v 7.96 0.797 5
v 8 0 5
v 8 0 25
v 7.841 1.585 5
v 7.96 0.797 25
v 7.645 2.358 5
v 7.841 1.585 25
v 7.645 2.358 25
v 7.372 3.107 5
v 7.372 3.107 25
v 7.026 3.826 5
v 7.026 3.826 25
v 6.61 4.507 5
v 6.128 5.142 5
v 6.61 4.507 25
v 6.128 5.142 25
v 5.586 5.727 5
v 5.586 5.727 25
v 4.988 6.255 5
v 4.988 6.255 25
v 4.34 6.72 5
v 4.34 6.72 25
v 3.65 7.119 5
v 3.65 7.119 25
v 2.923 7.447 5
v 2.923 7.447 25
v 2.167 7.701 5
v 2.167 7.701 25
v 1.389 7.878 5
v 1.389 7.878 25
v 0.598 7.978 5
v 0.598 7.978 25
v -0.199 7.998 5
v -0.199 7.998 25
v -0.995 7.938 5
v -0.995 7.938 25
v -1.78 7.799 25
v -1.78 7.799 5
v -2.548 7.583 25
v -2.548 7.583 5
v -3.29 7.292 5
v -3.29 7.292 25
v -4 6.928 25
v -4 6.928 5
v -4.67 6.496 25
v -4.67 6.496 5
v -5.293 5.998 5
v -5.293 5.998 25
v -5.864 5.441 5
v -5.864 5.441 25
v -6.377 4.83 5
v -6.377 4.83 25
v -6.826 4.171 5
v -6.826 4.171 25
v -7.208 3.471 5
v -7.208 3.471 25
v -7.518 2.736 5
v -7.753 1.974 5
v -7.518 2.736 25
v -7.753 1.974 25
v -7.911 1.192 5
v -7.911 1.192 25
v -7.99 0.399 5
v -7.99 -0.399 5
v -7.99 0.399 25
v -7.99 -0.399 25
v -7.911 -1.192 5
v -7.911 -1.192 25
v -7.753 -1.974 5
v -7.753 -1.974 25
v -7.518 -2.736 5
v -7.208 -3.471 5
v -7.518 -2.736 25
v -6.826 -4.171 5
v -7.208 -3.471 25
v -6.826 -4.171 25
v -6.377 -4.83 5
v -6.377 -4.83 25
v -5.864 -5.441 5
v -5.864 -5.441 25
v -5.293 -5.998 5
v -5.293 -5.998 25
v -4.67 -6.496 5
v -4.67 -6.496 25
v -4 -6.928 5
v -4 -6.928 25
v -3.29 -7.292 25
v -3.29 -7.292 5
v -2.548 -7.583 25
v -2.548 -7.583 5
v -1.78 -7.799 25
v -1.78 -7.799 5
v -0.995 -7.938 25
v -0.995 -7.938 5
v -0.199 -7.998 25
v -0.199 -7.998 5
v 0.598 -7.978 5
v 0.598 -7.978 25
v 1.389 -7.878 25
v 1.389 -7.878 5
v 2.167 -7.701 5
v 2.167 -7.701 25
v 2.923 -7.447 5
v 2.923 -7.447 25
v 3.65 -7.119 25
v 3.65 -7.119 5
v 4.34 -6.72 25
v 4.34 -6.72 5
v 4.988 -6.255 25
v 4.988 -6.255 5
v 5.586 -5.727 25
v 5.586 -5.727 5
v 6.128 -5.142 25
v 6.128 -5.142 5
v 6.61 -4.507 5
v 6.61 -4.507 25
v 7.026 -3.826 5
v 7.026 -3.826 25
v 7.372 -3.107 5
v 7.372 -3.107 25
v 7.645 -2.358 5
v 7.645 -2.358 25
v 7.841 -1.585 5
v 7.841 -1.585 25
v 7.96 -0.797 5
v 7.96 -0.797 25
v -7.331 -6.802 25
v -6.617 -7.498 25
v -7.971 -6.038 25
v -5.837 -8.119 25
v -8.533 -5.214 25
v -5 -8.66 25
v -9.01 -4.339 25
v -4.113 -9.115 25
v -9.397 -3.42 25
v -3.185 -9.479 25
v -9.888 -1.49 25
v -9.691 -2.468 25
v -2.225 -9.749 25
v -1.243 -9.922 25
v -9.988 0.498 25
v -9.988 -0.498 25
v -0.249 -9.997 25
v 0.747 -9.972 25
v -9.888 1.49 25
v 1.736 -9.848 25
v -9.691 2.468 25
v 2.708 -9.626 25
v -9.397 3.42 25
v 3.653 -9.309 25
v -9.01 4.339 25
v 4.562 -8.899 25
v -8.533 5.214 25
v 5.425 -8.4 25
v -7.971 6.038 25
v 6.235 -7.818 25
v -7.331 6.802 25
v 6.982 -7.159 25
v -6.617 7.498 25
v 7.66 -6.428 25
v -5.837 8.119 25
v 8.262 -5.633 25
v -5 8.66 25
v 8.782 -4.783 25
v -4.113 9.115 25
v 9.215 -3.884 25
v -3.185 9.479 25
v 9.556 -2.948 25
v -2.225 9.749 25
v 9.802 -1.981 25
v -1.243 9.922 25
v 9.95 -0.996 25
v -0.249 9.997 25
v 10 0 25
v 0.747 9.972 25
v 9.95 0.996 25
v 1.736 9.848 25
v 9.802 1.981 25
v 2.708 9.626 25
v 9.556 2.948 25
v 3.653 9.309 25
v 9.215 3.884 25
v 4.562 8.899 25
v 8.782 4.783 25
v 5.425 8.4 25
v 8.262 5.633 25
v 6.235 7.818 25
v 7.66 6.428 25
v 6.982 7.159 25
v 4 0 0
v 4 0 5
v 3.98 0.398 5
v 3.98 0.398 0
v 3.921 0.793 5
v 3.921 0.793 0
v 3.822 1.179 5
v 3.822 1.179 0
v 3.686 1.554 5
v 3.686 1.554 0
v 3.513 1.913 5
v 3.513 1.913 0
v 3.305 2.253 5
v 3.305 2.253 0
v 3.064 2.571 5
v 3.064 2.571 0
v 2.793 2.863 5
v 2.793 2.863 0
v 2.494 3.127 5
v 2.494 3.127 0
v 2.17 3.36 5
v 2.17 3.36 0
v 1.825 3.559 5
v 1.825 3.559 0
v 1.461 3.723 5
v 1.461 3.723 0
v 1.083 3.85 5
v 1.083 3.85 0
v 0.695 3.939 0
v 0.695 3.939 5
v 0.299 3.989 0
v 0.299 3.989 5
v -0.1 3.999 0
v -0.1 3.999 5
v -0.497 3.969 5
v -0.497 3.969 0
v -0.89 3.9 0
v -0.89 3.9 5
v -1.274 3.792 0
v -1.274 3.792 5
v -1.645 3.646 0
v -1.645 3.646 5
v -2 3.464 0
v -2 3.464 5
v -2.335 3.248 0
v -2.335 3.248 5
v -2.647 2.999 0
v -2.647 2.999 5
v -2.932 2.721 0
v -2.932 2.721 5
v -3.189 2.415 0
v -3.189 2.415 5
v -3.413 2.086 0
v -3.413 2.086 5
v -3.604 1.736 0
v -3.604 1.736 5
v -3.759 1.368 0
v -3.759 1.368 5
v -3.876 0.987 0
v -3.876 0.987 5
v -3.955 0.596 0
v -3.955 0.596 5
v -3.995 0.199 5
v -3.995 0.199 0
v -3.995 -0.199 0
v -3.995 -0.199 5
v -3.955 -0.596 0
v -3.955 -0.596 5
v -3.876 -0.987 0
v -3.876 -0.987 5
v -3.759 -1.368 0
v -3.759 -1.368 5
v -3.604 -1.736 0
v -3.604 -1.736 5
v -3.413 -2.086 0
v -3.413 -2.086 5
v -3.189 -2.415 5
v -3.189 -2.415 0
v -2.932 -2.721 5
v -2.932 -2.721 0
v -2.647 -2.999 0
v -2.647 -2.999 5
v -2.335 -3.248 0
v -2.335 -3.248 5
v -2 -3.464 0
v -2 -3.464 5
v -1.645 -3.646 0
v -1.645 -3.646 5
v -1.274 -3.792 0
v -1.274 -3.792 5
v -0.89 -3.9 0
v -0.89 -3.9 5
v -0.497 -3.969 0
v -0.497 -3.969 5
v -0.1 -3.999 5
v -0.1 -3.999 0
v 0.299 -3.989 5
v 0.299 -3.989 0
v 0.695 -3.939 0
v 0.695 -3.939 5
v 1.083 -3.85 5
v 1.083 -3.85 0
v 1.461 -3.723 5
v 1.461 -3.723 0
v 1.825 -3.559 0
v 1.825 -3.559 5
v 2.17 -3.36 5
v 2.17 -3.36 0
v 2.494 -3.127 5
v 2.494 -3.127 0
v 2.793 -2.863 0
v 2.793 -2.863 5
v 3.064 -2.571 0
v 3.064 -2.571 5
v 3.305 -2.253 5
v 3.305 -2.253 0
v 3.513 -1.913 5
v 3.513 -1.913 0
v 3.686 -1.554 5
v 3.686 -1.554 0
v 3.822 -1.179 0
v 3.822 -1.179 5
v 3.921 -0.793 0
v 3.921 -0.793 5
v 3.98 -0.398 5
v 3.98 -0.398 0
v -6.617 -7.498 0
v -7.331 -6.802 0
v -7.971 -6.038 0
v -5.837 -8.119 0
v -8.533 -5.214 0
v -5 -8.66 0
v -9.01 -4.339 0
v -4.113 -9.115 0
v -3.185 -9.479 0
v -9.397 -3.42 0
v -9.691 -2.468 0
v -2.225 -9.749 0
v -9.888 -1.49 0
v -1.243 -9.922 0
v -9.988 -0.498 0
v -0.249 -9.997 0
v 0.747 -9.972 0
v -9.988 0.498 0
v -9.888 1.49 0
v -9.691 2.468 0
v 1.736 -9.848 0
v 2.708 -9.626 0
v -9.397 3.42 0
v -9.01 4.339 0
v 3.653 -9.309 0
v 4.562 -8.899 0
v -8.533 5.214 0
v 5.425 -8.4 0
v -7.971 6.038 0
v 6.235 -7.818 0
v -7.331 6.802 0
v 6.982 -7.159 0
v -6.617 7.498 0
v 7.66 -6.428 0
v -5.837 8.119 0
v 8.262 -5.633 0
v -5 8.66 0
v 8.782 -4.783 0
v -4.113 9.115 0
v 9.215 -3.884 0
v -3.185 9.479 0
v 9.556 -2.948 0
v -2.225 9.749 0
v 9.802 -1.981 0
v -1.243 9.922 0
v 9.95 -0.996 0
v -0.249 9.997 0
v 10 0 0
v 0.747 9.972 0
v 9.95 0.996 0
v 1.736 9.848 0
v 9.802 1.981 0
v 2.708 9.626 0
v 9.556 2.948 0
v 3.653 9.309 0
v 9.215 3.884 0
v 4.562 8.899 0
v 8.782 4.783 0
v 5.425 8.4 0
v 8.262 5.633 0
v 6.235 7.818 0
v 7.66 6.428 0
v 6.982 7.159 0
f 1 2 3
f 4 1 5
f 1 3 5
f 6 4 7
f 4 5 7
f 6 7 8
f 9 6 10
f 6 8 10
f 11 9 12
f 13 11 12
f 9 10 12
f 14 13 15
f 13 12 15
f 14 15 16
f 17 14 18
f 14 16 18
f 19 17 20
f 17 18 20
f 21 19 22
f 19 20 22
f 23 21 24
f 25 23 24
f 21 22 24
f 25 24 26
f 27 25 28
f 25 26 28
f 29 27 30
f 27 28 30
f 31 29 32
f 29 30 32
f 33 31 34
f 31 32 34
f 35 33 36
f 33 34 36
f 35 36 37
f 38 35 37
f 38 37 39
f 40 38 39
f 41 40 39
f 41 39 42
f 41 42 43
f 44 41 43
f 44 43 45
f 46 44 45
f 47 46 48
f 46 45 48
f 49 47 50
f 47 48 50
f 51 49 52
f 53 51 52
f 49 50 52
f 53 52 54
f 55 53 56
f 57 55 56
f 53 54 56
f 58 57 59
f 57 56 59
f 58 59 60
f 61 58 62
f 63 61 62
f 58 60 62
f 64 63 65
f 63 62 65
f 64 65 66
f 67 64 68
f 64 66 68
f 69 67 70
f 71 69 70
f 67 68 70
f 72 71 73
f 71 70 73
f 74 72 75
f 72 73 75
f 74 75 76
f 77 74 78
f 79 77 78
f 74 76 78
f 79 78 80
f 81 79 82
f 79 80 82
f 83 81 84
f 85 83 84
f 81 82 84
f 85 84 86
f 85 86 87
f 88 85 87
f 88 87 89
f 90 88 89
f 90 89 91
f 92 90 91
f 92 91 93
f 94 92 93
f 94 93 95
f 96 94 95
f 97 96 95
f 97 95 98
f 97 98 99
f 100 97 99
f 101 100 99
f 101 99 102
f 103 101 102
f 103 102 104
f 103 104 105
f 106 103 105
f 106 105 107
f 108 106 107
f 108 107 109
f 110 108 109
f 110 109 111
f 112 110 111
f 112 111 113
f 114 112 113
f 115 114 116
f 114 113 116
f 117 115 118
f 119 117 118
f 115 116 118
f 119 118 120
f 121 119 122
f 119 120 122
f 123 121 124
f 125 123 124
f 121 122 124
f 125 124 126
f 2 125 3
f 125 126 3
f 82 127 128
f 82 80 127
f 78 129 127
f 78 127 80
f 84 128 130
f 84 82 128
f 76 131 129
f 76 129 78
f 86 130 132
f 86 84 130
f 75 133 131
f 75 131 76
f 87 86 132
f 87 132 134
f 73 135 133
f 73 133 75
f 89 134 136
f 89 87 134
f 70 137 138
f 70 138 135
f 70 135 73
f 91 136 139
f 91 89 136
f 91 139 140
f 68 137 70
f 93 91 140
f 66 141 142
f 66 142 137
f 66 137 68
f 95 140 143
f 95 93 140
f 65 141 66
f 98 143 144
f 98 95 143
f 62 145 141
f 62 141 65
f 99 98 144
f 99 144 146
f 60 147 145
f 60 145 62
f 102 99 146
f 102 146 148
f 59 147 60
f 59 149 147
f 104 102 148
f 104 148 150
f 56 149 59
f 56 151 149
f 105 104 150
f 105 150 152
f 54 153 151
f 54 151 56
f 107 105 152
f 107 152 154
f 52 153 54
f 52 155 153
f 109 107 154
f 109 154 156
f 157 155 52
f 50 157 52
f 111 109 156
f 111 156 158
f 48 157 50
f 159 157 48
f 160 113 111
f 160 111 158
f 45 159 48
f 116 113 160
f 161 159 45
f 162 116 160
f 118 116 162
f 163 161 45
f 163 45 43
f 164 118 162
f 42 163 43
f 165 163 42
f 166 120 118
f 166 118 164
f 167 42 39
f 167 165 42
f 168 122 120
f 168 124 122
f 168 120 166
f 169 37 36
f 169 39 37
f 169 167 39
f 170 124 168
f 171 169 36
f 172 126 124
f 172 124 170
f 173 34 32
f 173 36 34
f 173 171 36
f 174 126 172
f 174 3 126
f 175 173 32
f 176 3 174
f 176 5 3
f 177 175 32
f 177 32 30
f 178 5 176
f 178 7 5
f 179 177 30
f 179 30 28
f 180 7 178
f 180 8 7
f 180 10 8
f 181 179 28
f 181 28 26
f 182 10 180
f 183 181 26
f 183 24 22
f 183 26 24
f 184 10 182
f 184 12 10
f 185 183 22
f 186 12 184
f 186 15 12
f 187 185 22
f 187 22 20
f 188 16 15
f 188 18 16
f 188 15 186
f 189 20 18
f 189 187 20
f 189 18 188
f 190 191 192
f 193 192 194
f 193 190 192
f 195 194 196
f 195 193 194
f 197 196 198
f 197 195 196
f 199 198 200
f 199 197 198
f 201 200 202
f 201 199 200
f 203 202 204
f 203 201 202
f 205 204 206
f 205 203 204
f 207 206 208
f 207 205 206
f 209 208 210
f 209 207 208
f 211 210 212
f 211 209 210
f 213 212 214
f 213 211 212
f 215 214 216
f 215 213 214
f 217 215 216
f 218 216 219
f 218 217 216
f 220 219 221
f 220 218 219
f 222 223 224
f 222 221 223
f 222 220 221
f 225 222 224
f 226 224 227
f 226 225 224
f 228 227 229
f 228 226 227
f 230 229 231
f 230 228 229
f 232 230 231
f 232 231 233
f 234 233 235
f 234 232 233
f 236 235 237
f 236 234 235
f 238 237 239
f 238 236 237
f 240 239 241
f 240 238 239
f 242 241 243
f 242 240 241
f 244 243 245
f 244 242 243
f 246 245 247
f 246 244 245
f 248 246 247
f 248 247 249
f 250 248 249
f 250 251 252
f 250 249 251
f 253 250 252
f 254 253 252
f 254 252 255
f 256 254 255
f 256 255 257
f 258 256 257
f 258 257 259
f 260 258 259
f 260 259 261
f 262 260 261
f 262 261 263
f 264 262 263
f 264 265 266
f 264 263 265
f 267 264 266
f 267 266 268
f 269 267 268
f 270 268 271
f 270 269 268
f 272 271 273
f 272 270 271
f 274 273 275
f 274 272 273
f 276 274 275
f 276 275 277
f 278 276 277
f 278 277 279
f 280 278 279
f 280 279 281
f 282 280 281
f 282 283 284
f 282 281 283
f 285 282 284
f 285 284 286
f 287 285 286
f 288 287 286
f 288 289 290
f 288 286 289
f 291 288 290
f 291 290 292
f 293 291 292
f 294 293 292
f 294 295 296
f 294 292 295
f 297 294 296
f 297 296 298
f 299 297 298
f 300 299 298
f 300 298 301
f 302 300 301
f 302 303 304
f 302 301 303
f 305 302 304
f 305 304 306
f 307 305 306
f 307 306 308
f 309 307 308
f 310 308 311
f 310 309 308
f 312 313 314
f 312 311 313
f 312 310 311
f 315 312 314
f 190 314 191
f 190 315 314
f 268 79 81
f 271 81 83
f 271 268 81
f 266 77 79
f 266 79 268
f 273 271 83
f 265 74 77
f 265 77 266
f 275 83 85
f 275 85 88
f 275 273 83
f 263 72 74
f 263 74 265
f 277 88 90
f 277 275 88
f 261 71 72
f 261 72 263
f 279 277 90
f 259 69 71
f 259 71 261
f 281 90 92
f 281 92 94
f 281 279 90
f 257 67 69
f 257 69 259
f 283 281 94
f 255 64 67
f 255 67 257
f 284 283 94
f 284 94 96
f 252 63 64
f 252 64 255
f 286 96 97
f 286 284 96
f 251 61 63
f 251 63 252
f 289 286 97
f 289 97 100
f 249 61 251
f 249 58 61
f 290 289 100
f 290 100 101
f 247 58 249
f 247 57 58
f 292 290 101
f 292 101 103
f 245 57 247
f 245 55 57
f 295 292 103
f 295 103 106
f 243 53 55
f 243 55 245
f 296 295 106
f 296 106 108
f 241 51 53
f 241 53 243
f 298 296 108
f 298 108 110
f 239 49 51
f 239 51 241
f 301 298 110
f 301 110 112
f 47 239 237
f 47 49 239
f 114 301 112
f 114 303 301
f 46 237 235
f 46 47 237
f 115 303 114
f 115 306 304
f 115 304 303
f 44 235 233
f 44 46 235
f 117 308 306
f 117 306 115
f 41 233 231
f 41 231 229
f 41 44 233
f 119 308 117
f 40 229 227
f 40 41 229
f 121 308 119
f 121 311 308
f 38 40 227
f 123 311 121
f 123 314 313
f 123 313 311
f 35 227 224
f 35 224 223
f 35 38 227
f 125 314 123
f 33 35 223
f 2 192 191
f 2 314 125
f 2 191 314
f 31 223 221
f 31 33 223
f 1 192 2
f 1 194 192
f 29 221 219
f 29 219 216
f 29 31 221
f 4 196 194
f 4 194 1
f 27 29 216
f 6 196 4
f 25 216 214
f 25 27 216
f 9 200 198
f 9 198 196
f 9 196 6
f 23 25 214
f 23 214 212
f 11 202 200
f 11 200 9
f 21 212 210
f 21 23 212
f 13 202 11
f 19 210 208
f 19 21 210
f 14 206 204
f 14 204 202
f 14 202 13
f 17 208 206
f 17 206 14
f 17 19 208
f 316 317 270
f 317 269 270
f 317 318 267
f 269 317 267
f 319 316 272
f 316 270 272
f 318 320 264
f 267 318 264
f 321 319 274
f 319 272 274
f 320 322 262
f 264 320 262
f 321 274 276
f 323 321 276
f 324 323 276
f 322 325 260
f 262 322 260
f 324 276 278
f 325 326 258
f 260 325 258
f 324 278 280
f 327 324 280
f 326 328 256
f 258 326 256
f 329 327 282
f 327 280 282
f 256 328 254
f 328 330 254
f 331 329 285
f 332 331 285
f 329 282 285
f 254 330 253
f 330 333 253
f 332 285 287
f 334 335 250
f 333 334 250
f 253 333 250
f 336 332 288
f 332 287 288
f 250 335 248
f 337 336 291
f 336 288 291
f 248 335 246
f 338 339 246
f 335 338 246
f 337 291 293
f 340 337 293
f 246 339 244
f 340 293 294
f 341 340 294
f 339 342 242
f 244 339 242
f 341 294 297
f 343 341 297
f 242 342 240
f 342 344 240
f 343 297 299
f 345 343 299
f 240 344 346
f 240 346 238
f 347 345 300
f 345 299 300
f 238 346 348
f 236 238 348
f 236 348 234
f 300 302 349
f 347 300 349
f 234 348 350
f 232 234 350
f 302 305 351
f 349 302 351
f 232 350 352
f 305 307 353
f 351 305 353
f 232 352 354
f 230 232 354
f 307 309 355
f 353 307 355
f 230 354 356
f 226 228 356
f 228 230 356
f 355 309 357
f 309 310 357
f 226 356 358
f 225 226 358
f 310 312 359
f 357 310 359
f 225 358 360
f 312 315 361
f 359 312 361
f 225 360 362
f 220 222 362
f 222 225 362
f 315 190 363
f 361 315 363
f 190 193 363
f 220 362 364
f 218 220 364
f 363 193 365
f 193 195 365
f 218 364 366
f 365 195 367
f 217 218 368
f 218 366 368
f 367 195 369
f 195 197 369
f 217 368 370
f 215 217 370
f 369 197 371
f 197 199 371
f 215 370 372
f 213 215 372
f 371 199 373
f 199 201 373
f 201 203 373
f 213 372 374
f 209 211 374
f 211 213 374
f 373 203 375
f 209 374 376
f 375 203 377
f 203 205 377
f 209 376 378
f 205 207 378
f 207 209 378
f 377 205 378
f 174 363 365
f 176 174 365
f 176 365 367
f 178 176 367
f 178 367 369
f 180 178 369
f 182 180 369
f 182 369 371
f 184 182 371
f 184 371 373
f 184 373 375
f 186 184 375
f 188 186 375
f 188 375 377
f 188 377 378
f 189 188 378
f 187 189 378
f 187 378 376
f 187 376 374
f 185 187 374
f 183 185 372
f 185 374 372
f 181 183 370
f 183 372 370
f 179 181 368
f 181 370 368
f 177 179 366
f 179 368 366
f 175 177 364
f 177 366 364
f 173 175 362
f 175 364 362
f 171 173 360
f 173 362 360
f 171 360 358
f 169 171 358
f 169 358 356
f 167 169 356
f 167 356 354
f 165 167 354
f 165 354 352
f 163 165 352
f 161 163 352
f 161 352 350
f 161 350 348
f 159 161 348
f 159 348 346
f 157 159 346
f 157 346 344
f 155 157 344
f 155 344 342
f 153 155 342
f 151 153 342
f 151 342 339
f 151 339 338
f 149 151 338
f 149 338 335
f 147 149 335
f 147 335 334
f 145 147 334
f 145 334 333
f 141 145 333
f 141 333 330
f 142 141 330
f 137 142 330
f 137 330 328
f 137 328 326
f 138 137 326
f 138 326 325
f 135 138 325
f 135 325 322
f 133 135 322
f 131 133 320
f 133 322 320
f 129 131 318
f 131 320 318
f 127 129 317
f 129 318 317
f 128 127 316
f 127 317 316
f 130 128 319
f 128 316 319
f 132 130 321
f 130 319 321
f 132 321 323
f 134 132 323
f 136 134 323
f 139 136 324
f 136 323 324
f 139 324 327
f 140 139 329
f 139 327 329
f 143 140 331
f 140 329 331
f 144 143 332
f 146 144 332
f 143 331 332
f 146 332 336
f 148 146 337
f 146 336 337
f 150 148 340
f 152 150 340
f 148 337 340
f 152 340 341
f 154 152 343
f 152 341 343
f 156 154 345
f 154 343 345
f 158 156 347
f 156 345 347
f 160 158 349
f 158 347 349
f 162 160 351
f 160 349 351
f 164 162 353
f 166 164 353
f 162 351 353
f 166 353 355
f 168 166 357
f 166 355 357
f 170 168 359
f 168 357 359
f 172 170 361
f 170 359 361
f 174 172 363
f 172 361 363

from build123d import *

# Parameters (mm, degrees)
F0_R     = 10
F0_R_2   = 4
F1_DEPTH = 25
F2_R     = 8
F3_DEPTH = 20
F4_DEPTH = 5


with BuildPart() as f1:
    # F0 (on Top) → F1 (new body)
    with BuildSketch(Plane.XY):
        Circle(F0_R)
        Circle(F0_R_2, mode=Mode.SUBTRACT)
    extrude(amount=F1_DEPTH)

    # F2 (on face) → F3 (cut)
    with BuildSketch(Plane.XY.offset(25)):
        Circle(F2_R)
    extrude(amount=-F3_DEPTH, mode=Mode.SUBTRACT)

    # F0 (on Top) → F4 (join)
    with BuildSketch(Plane.XY):
        Circle(F0_R)
        Circle(F0_R_2, mode=Mode.SUBTRACT)
    extrude(amount=F4_DEPTH)


solid = f1.part
